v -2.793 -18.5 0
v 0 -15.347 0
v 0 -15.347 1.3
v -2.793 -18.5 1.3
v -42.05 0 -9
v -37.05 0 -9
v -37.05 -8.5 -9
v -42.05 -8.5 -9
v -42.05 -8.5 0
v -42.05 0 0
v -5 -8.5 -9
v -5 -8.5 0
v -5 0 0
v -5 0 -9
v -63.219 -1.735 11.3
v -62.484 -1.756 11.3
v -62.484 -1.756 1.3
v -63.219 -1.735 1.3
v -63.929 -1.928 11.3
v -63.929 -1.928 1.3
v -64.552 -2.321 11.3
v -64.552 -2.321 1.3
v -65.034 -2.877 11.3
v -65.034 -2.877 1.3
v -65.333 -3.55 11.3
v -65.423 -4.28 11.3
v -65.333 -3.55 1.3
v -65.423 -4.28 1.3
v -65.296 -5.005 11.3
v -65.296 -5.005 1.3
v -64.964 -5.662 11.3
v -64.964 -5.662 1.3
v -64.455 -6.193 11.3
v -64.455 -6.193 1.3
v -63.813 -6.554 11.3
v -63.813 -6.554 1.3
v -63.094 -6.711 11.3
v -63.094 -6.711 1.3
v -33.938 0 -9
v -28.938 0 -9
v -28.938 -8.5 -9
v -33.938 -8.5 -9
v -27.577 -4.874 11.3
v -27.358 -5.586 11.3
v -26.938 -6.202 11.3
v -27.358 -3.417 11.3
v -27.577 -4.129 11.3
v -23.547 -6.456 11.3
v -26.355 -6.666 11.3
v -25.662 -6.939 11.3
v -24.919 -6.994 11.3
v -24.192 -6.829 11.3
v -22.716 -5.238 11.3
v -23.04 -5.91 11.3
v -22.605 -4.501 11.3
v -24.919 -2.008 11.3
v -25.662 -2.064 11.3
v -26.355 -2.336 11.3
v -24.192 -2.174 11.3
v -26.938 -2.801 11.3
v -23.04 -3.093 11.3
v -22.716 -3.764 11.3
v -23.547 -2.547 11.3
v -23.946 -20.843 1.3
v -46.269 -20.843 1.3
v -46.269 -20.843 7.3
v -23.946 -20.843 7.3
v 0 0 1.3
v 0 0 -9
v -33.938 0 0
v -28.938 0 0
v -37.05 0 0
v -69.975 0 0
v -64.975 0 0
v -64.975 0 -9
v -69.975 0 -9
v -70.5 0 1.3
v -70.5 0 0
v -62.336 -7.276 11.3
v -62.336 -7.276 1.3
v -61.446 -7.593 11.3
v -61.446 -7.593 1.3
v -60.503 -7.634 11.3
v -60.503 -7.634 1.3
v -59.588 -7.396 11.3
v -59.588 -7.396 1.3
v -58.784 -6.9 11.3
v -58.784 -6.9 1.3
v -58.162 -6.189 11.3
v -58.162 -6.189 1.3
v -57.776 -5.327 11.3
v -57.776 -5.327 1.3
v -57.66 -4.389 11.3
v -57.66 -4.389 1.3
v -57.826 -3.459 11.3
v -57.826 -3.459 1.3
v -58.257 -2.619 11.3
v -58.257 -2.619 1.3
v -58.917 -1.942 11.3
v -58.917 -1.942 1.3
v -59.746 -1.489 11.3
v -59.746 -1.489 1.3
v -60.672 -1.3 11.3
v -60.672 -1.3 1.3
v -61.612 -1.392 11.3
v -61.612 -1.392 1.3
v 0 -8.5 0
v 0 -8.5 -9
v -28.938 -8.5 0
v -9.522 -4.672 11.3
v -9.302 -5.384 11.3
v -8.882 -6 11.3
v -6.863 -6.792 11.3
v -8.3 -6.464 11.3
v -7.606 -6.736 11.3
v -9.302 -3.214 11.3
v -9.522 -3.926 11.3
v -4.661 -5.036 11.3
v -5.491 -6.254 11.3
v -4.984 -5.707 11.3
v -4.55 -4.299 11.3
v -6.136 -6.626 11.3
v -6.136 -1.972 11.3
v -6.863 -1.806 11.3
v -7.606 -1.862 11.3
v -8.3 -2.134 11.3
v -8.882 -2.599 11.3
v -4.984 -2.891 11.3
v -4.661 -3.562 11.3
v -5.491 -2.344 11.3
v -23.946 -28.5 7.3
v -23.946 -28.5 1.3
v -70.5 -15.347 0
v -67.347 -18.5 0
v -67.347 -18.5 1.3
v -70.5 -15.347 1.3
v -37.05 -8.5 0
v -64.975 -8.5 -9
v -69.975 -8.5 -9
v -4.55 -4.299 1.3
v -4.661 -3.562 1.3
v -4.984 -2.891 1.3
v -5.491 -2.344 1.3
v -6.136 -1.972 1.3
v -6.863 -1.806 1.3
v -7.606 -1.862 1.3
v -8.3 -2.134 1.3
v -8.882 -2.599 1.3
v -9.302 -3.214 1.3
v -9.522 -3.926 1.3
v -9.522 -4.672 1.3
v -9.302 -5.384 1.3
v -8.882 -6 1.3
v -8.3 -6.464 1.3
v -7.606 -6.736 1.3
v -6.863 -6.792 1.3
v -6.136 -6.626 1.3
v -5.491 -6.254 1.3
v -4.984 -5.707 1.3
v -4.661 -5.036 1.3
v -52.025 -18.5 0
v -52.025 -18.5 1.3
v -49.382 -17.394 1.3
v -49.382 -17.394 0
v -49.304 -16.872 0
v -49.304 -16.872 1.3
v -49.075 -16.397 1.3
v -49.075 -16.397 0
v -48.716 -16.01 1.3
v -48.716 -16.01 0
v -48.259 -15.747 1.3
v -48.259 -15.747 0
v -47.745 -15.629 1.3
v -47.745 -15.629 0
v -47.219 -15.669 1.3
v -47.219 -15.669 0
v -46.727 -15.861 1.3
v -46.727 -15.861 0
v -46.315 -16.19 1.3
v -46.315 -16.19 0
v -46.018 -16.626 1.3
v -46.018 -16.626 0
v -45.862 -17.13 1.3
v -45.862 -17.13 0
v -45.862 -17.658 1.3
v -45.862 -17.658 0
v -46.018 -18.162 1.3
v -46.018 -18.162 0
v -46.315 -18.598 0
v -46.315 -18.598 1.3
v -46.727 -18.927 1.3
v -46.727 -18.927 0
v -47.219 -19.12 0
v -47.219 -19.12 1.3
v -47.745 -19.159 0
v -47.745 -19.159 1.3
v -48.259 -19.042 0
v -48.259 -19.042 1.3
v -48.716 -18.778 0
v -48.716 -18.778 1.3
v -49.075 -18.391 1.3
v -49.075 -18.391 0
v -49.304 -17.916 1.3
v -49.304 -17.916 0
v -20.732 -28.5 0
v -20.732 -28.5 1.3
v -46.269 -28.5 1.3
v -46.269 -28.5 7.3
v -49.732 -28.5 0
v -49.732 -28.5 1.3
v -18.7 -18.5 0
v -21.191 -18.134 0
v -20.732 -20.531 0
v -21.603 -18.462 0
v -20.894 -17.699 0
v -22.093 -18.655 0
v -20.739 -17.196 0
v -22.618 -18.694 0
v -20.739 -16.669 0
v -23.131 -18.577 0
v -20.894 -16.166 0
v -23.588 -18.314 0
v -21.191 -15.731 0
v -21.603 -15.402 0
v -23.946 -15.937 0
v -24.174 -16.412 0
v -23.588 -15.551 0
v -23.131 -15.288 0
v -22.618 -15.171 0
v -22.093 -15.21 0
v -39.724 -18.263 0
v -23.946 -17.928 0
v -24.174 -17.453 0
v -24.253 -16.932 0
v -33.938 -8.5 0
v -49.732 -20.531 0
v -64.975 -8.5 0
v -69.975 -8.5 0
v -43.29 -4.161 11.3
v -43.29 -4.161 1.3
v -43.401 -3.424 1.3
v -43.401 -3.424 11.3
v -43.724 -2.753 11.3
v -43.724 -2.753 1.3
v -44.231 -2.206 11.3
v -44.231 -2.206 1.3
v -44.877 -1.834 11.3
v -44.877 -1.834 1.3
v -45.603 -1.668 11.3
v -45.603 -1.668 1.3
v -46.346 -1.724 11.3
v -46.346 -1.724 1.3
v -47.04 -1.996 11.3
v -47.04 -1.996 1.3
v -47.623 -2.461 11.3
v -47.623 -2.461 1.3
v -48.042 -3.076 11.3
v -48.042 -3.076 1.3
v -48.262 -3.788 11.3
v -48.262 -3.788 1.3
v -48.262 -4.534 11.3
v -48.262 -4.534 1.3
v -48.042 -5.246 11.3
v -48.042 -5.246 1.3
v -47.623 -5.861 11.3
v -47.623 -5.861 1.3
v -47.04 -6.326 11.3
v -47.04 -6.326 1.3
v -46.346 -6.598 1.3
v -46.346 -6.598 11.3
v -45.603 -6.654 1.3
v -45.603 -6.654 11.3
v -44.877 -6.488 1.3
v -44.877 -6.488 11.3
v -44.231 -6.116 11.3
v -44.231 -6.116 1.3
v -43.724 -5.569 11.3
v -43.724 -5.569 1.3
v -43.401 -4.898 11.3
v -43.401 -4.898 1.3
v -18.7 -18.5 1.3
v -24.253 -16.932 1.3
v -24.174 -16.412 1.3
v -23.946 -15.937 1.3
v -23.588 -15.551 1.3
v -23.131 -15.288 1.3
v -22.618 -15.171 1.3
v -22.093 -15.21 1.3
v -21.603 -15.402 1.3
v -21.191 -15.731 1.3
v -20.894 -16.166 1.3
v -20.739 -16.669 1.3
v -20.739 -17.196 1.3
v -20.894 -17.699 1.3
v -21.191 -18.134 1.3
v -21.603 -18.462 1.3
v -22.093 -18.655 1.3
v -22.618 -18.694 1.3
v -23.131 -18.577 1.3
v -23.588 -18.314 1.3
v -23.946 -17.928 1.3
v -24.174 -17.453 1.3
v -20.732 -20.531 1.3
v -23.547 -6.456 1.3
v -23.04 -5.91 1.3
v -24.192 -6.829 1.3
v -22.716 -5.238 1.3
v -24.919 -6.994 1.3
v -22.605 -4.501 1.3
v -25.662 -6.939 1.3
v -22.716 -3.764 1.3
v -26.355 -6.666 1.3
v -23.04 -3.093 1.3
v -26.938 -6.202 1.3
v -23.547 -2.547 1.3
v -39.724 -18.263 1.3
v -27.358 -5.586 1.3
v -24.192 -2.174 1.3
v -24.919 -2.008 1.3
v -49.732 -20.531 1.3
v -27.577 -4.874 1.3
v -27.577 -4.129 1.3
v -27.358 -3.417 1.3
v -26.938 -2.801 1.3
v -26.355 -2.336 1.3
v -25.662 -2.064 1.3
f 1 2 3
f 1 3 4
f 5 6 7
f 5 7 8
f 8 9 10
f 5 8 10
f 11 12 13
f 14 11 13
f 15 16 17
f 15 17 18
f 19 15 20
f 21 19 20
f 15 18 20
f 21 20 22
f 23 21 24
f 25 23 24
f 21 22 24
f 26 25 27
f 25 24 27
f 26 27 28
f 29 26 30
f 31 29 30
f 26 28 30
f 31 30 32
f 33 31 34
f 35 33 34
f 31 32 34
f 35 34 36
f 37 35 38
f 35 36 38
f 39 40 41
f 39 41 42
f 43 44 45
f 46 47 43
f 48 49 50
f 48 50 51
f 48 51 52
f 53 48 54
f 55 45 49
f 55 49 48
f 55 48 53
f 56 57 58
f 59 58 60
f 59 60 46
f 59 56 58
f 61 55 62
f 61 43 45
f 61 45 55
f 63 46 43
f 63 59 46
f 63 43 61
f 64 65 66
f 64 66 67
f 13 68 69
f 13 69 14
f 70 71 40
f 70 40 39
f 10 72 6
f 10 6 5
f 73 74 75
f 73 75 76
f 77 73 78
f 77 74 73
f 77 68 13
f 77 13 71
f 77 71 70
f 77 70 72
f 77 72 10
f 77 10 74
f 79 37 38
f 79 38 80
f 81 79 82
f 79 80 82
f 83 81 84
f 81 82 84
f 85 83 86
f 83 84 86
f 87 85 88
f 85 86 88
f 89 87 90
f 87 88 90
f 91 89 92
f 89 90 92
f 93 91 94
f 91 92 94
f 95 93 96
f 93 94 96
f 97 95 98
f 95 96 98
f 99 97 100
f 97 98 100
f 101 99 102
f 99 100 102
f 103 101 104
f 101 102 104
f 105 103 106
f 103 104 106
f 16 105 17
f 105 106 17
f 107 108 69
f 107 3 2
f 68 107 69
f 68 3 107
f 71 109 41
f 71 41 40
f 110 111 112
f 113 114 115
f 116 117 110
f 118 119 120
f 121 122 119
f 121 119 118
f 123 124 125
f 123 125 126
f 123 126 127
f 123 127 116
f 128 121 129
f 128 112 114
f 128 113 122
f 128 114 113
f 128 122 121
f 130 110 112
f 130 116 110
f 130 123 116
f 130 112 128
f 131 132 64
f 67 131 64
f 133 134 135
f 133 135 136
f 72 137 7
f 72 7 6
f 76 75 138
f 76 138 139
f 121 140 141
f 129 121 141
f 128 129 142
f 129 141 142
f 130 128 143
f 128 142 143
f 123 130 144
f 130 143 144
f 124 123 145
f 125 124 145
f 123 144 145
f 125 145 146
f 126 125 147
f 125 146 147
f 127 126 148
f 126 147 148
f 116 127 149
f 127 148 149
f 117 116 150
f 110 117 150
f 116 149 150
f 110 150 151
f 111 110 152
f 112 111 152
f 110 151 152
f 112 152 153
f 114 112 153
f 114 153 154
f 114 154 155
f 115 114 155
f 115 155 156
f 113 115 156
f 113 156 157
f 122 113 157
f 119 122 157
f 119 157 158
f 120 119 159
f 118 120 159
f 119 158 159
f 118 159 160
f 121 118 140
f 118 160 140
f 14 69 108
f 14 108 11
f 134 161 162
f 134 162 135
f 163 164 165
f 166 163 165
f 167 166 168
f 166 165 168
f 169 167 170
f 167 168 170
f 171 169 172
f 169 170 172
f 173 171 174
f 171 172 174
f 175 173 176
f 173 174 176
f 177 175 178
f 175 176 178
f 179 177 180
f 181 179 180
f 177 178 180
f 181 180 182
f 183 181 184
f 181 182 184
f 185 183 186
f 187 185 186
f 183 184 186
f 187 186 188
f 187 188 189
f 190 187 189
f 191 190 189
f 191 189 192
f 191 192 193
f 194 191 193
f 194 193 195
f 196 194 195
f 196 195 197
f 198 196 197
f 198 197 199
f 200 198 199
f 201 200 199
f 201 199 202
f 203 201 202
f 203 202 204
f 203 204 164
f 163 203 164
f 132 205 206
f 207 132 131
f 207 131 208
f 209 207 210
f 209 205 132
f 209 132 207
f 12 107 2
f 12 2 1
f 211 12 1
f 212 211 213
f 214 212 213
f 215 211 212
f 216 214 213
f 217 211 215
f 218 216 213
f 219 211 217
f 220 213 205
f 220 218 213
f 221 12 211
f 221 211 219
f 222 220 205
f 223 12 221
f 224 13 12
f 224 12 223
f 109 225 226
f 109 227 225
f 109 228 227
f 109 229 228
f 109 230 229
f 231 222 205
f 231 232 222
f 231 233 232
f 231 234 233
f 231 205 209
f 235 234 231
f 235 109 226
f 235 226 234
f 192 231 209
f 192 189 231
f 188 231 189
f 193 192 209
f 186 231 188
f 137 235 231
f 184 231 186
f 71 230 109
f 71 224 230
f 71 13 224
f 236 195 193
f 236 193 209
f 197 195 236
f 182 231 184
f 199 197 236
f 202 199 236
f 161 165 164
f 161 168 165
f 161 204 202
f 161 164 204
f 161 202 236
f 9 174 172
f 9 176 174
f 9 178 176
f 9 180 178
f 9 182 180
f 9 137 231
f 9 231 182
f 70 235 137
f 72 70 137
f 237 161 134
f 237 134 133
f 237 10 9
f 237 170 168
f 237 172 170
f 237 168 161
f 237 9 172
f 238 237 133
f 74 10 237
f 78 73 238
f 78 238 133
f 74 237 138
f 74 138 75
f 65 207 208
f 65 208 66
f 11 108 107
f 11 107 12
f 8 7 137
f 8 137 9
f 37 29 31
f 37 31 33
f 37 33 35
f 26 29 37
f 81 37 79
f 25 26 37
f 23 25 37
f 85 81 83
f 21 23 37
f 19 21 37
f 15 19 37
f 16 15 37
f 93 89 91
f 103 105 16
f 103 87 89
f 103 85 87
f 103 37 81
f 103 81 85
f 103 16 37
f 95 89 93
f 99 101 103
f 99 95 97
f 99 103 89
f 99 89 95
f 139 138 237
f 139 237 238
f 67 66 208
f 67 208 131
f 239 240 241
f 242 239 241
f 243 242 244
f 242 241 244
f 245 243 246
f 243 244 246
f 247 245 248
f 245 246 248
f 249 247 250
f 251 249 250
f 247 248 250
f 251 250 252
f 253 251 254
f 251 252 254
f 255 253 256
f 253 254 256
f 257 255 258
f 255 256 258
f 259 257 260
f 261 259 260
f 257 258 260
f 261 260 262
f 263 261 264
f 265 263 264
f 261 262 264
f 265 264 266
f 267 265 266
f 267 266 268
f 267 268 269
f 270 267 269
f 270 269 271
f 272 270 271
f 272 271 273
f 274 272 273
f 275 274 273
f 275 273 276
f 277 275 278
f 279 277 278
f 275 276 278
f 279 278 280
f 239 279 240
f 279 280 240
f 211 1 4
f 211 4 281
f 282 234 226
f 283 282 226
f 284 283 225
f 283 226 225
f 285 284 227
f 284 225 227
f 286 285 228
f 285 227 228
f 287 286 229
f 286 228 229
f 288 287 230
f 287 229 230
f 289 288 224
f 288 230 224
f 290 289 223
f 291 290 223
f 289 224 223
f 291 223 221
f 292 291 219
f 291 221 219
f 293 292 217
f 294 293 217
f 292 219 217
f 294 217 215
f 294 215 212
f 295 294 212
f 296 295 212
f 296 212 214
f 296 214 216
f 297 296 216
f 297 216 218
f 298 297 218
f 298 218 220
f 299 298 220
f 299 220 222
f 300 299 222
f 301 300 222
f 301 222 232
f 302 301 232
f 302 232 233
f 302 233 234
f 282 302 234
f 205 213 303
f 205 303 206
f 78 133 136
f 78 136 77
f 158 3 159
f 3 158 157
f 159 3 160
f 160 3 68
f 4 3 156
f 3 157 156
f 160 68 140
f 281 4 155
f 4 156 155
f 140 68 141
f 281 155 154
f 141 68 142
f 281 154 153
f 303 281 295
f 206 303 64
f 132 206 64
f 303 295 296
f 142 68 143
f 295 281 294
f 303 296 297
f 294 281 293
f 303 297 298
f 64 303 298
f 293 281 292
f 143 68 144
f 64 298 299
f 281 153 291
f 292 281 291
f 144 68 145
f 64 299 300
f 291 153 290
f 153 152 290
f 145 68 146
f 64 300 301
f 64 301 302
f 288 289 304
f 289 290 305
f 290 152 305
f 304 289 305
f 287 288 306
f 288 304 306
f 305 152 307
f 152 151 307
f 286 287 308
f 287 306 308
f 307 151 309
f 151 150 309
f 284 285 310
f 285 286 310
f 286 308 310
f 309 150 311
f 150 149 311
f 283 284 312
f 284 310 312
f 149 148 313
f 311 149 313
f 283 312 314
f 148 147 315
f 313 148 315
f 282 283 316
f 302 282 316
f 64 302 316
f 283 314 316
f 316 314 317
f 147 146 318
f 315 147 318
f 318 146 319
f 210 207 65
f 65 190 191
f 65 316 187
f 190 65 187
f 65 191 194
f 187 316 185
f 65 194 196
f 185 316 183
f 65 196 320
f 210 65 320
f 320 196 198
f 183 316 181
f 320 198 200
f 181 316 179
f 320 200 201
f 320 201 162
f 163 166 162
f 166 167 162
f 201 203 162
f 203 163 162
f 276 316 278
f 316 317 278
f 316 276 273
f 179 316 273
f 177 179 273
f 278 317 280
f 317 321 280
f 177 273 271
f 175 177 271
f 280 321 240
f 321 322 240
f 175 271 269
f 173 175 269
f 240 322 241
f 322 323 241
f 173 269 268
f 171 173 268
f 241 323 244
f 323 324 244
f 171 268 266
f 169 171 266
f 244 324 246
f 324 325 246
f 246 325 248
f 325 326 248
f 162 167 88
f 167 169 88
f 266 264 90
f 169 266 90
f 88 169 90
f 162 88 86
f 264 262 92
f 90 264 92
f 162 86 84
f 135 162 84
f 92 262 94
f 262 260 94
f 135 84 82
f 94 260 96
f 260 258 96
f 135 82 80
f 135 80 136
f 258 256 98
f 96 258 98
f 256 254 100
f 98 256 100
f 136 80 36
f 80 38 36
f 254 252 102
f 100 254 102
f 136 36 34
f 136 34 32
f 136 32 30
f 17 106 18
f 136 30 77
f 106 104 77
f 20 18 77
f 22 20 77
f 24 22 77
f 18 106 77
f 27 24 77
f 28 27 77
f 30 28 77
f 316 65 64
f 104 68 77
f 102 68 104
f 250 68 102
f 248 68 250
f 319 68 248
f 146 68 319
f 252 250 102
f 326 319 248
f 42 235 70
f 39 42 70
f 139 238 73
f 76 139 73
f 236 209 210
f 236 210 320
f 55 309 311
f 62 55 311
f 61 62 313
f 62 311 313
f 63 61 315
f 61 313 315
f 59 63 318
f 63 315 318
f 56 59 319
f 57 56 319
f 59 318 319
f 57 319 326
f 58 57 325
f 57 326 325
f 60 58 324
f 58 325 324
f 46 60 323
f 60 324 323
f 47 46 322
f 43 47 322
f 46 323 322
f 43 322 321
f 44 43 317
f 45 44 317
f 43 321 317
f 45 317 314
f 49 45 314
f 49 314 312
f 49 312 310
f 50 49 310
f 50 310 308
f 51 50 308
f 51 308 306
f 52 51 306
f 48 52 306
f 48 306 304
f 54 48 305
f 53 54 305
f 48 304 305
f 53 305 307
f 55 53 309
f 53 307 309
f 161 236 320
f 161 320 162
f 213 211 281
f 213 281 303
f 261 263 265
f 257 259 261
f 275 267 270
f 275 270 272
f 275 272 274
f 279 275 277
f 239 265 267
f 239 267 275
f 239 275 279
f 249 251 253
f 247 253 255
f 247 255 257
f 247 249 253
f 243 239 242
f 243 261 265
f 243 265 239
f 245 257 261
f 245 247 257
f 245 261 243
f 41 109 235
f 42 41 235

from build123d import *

# Parameters (mm, degrees)
EXTRUDE_1_DEPTH     = 1.3
SKETCH_2_R          = 6.1271e-05
SKETCH_2_R_2        = 1.854699803
CUT_EXTRUDE_1_DEPTH = 1.3
SKETCH_3_W          = 5
SKETCH_3_H          = 8.5
EXTRUDE_2_DEPTH     = 9
SKETCH_4_W          = 22.322793398
SKETCH_4_H          = 7.656611546
EXTRUDE_3_DEPTH     = 6
SKETCH_7_R          = 2.060894962
SKETCH_7_R_2        = 0.009430026
EXTRUDE_6_DEPTH     = 1.3
SKETCH_9_R          = 1.766576119
SKETCH_9_R_2        = 1.77
CUT_EXTRUDE_4_DEPTH = 13.5
SKETCH_11_R         = 2.5
EXTRUDE_7_DEPTH     = 10
SKETCH_5_R          = 3.177873229
EXTRUDE_4_DEPTH     = 10


with BuildPart() as part:
    # 草图1 → 凸台-拉伸1 (new body)
    with BuildSketch(Plane.XY):
        Polygon((-20.731582571, -20.531304637), (-20.731582571, -28.5), (-49.731582571, -28.5), (-49.731582571, -20.531304637), (-52.024986974, -18.5), (-67.347016347, -18.5), (-70.5, -15.347016347), (-70.5, 0), (0, 0), (0, -15.347016347), (-2.792647606, -18.5), (-18.700277933, -18.5), align=None)
    extrude(amount=EXTRUDE_1_DEPTH)

    # 草图2 → 切除-拉伸1 (cut)
    with BuildSketch(Plane(origin=(-0.901876225, 0, 0), x_dir=(-1, 0, 0), z_dir=(0, 0, -1))):
        with Locations((38.822404022, -18.263145779)):
            Circle(SKETCH_2_R)
        with Locations((24.094803283, -18.263145779)):
            Circle(SKETCH_2_R_2)
    extrude(amount=-CUT_EXTRUDE_1_DEPTH, mode=Mode.SUBTRACT)

    # 草图3 → 凸台-拉伸2 (add)
    with BuildSketch(Plane(origin=(0, 0, 0), x_dir=(-1, 0, 0), z_dir=(0, 0, -1))):
        with Locations((2.5, -4.25)):
            Rectangle(SKETCH_3_W, SKETCH_3_H)
        with Locations((31.437833881, -4.25)):
            Rectangle(SKETCH_3_W, SKETCH_3_H)
        with Locations((39.549598659, -4.25)):
            Rectangle(SKETCH_3_W, SKETCH_3_H)
        with Locations((67.475480729, -4.25)):
            Rectangle(SKETCH_3_W, SKETCH_3_H)
    extrude(amount=EXTRUDE_2_DEPTH)

    # 草图4 → 凸台-拉伸3 (add)
    with BuildSketch(Plane.XY.offset(1.3)):
        with Locations((-35.107201512, -24.671694227)):
            Rectangle(SKETCH_4_W, SKETCH_4_H)
    extrude(amount=EXTRUDE_3_DEPTH)

    # 草图7 → 凸台-拉伸6 (add)
    with BuildSketch(Plane(origin=(0, 0, 0), x_dir=(-1, 0, 0), z_dir=(0, 0, -1))):
        with Locations((24.996679508, -18.263145779)):
            Circle(SKETCH_7_R)
        with Locations((22.922712851, -19.688356139)):
            Circle(SKETCH_7_R_2)
    extrude(amount=-EXTRUDE_6_DEPTH)

    # 草图9 → 切除-拉伸4 (cut)
    with BuildSketch(Plane(origin=(0, 0, 0), x_dir=(-1, 0, 0), z_dir=(0, 0, -1))):
        with Locations((22.486064791, -16.932374865)):
            Circle(SKETCH_9_R)
        with Locations((47.612418274, -17.394192754)):
            Circle(SKETCH_9_R_2)
    extrude(amount=-CUT_EXTRUDE_4_DEPTH, mode=Mode.SUBTRACT)

    # 草图11 → 凸台-拉伸7 (add)
    with BuildSketch(Plane.XY.offset(1.3)):
        with Locations((-7.049667213, -4.299078236)):
            Circle(SKETCH_11_R)
        with Locations((-25.10539175, -4.501377507)):
            Circle(SKETCH_11_R)
        with Locations((-45.789989635, -4.160939668)):
            Circle(SKETCH_11_R)
        with Locations((-62.923589595, -4.217113271)):
            Circle(SKETCH_11_R)
    extrude(amount=EXTRUDE_7_DEPTH)

    # 草图5 → 凸台-拉伸4 (add)
    with BuildSketch(Plane.XY.offset(1.3)):
        with Locations((-60.836996038, -4.474043661)):
            Circle(SKETCH_5_R)
    extrude(amount=EXTRUDE_4_DEPTH)


solid = part.part
